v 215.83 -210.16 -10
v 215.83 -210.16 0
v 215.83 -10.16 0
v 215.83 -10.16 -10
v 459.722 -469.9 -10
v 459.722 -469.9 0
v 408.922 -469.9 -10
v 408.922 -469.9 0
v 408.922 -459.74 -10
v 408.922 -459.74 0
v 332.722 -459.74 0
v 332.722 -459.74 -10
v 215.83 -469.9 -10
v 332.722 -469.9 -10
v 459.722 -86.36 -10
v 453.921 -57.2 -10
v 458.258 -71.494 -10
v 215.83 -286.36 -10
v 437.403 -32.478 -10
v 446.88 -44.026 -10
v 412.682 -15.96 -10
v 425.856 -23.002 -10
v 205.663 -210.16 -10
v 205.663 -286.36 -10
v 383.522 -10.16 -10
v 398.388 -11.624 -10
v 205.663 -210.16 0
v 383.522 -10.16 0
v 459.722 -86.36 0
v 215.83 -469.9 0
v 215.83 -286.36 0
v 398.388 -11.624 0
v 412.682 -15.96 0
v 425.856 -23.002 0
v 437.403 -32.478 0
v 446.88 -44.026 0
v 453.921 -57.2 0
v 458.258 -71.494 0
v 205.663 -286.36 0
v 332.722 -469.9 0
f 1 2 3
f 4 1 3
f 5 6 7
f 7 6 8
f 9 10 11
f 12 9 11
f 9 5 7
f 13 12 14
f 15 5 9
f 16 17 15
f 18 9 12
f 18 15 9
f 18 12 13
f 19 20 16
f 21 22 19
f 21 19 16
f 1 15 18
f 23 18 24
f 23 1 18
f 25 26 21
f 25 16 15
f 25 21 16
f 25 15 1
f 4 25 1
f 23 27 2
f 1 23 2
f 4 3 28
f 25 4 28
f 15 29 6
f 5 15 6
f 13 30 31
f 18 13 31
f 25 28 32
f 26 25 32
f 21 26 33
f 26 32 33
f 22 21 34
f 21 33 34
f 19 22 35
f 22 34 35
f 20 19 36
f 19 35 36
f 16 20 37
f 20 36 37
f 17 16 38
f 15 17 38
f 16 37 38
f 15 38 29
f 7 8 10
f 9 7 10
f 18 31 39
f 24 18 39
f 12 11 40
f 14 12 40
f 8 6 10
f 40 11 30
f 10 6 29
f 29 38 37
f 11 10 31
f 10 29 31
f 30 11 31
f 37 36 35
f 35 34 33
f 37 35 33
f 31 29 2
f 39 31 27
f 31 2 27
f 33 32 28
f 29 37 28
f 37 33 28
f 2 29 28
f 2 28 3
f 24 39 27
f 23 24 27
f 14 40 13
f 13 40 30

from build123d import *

# Parameters (mm, degrees)
BOSS_EXTRUDE1_DEPTH = 10


with BuildPart() as part:
    # Sketch1 → Boss-Extrude1 (new body)
    with BuildSketch(Plane.XY):
        with BuildLine():
            Line((215.829586762, -10.16), (383.521789204, -10.16))
            ThreePointArc((383.521789204, -10.16), (437.403325931, -32.478463274), (459.721789204, -86.36))
            Line((459.721789204, -86.36), (459.721789204, -469.9))
            Line((459.721789204, -469.9), (408.921789204, -469.9))
            Line((408.921789204, -469.9), (408.921789204, -459.74))
            Line((408.921789204, -459.74), (332.721789204, -459.74))
            Line((332.721789204, -459.74), (332.721789204, -469.9))
            Line((332.721789204, -469.9), (215.829586762, -469.9))
            Line((215.829586762, -469.9), (215.829586762, -286.36))
            Line((215.829586762, -286.36), (205.663096361, -286.36))
            Line((205.663096361, -286.36), (205.663096361, -210.16))
            Line((205.663096361, -210.16), (215.829586762, -210.16))
            Line((215.829586762, -210.16), (215.829586762, -10.16))
        make_face()
    extrude(amount=-BOSS_EXTRUDE1_DEPTH)


solid = part.part
